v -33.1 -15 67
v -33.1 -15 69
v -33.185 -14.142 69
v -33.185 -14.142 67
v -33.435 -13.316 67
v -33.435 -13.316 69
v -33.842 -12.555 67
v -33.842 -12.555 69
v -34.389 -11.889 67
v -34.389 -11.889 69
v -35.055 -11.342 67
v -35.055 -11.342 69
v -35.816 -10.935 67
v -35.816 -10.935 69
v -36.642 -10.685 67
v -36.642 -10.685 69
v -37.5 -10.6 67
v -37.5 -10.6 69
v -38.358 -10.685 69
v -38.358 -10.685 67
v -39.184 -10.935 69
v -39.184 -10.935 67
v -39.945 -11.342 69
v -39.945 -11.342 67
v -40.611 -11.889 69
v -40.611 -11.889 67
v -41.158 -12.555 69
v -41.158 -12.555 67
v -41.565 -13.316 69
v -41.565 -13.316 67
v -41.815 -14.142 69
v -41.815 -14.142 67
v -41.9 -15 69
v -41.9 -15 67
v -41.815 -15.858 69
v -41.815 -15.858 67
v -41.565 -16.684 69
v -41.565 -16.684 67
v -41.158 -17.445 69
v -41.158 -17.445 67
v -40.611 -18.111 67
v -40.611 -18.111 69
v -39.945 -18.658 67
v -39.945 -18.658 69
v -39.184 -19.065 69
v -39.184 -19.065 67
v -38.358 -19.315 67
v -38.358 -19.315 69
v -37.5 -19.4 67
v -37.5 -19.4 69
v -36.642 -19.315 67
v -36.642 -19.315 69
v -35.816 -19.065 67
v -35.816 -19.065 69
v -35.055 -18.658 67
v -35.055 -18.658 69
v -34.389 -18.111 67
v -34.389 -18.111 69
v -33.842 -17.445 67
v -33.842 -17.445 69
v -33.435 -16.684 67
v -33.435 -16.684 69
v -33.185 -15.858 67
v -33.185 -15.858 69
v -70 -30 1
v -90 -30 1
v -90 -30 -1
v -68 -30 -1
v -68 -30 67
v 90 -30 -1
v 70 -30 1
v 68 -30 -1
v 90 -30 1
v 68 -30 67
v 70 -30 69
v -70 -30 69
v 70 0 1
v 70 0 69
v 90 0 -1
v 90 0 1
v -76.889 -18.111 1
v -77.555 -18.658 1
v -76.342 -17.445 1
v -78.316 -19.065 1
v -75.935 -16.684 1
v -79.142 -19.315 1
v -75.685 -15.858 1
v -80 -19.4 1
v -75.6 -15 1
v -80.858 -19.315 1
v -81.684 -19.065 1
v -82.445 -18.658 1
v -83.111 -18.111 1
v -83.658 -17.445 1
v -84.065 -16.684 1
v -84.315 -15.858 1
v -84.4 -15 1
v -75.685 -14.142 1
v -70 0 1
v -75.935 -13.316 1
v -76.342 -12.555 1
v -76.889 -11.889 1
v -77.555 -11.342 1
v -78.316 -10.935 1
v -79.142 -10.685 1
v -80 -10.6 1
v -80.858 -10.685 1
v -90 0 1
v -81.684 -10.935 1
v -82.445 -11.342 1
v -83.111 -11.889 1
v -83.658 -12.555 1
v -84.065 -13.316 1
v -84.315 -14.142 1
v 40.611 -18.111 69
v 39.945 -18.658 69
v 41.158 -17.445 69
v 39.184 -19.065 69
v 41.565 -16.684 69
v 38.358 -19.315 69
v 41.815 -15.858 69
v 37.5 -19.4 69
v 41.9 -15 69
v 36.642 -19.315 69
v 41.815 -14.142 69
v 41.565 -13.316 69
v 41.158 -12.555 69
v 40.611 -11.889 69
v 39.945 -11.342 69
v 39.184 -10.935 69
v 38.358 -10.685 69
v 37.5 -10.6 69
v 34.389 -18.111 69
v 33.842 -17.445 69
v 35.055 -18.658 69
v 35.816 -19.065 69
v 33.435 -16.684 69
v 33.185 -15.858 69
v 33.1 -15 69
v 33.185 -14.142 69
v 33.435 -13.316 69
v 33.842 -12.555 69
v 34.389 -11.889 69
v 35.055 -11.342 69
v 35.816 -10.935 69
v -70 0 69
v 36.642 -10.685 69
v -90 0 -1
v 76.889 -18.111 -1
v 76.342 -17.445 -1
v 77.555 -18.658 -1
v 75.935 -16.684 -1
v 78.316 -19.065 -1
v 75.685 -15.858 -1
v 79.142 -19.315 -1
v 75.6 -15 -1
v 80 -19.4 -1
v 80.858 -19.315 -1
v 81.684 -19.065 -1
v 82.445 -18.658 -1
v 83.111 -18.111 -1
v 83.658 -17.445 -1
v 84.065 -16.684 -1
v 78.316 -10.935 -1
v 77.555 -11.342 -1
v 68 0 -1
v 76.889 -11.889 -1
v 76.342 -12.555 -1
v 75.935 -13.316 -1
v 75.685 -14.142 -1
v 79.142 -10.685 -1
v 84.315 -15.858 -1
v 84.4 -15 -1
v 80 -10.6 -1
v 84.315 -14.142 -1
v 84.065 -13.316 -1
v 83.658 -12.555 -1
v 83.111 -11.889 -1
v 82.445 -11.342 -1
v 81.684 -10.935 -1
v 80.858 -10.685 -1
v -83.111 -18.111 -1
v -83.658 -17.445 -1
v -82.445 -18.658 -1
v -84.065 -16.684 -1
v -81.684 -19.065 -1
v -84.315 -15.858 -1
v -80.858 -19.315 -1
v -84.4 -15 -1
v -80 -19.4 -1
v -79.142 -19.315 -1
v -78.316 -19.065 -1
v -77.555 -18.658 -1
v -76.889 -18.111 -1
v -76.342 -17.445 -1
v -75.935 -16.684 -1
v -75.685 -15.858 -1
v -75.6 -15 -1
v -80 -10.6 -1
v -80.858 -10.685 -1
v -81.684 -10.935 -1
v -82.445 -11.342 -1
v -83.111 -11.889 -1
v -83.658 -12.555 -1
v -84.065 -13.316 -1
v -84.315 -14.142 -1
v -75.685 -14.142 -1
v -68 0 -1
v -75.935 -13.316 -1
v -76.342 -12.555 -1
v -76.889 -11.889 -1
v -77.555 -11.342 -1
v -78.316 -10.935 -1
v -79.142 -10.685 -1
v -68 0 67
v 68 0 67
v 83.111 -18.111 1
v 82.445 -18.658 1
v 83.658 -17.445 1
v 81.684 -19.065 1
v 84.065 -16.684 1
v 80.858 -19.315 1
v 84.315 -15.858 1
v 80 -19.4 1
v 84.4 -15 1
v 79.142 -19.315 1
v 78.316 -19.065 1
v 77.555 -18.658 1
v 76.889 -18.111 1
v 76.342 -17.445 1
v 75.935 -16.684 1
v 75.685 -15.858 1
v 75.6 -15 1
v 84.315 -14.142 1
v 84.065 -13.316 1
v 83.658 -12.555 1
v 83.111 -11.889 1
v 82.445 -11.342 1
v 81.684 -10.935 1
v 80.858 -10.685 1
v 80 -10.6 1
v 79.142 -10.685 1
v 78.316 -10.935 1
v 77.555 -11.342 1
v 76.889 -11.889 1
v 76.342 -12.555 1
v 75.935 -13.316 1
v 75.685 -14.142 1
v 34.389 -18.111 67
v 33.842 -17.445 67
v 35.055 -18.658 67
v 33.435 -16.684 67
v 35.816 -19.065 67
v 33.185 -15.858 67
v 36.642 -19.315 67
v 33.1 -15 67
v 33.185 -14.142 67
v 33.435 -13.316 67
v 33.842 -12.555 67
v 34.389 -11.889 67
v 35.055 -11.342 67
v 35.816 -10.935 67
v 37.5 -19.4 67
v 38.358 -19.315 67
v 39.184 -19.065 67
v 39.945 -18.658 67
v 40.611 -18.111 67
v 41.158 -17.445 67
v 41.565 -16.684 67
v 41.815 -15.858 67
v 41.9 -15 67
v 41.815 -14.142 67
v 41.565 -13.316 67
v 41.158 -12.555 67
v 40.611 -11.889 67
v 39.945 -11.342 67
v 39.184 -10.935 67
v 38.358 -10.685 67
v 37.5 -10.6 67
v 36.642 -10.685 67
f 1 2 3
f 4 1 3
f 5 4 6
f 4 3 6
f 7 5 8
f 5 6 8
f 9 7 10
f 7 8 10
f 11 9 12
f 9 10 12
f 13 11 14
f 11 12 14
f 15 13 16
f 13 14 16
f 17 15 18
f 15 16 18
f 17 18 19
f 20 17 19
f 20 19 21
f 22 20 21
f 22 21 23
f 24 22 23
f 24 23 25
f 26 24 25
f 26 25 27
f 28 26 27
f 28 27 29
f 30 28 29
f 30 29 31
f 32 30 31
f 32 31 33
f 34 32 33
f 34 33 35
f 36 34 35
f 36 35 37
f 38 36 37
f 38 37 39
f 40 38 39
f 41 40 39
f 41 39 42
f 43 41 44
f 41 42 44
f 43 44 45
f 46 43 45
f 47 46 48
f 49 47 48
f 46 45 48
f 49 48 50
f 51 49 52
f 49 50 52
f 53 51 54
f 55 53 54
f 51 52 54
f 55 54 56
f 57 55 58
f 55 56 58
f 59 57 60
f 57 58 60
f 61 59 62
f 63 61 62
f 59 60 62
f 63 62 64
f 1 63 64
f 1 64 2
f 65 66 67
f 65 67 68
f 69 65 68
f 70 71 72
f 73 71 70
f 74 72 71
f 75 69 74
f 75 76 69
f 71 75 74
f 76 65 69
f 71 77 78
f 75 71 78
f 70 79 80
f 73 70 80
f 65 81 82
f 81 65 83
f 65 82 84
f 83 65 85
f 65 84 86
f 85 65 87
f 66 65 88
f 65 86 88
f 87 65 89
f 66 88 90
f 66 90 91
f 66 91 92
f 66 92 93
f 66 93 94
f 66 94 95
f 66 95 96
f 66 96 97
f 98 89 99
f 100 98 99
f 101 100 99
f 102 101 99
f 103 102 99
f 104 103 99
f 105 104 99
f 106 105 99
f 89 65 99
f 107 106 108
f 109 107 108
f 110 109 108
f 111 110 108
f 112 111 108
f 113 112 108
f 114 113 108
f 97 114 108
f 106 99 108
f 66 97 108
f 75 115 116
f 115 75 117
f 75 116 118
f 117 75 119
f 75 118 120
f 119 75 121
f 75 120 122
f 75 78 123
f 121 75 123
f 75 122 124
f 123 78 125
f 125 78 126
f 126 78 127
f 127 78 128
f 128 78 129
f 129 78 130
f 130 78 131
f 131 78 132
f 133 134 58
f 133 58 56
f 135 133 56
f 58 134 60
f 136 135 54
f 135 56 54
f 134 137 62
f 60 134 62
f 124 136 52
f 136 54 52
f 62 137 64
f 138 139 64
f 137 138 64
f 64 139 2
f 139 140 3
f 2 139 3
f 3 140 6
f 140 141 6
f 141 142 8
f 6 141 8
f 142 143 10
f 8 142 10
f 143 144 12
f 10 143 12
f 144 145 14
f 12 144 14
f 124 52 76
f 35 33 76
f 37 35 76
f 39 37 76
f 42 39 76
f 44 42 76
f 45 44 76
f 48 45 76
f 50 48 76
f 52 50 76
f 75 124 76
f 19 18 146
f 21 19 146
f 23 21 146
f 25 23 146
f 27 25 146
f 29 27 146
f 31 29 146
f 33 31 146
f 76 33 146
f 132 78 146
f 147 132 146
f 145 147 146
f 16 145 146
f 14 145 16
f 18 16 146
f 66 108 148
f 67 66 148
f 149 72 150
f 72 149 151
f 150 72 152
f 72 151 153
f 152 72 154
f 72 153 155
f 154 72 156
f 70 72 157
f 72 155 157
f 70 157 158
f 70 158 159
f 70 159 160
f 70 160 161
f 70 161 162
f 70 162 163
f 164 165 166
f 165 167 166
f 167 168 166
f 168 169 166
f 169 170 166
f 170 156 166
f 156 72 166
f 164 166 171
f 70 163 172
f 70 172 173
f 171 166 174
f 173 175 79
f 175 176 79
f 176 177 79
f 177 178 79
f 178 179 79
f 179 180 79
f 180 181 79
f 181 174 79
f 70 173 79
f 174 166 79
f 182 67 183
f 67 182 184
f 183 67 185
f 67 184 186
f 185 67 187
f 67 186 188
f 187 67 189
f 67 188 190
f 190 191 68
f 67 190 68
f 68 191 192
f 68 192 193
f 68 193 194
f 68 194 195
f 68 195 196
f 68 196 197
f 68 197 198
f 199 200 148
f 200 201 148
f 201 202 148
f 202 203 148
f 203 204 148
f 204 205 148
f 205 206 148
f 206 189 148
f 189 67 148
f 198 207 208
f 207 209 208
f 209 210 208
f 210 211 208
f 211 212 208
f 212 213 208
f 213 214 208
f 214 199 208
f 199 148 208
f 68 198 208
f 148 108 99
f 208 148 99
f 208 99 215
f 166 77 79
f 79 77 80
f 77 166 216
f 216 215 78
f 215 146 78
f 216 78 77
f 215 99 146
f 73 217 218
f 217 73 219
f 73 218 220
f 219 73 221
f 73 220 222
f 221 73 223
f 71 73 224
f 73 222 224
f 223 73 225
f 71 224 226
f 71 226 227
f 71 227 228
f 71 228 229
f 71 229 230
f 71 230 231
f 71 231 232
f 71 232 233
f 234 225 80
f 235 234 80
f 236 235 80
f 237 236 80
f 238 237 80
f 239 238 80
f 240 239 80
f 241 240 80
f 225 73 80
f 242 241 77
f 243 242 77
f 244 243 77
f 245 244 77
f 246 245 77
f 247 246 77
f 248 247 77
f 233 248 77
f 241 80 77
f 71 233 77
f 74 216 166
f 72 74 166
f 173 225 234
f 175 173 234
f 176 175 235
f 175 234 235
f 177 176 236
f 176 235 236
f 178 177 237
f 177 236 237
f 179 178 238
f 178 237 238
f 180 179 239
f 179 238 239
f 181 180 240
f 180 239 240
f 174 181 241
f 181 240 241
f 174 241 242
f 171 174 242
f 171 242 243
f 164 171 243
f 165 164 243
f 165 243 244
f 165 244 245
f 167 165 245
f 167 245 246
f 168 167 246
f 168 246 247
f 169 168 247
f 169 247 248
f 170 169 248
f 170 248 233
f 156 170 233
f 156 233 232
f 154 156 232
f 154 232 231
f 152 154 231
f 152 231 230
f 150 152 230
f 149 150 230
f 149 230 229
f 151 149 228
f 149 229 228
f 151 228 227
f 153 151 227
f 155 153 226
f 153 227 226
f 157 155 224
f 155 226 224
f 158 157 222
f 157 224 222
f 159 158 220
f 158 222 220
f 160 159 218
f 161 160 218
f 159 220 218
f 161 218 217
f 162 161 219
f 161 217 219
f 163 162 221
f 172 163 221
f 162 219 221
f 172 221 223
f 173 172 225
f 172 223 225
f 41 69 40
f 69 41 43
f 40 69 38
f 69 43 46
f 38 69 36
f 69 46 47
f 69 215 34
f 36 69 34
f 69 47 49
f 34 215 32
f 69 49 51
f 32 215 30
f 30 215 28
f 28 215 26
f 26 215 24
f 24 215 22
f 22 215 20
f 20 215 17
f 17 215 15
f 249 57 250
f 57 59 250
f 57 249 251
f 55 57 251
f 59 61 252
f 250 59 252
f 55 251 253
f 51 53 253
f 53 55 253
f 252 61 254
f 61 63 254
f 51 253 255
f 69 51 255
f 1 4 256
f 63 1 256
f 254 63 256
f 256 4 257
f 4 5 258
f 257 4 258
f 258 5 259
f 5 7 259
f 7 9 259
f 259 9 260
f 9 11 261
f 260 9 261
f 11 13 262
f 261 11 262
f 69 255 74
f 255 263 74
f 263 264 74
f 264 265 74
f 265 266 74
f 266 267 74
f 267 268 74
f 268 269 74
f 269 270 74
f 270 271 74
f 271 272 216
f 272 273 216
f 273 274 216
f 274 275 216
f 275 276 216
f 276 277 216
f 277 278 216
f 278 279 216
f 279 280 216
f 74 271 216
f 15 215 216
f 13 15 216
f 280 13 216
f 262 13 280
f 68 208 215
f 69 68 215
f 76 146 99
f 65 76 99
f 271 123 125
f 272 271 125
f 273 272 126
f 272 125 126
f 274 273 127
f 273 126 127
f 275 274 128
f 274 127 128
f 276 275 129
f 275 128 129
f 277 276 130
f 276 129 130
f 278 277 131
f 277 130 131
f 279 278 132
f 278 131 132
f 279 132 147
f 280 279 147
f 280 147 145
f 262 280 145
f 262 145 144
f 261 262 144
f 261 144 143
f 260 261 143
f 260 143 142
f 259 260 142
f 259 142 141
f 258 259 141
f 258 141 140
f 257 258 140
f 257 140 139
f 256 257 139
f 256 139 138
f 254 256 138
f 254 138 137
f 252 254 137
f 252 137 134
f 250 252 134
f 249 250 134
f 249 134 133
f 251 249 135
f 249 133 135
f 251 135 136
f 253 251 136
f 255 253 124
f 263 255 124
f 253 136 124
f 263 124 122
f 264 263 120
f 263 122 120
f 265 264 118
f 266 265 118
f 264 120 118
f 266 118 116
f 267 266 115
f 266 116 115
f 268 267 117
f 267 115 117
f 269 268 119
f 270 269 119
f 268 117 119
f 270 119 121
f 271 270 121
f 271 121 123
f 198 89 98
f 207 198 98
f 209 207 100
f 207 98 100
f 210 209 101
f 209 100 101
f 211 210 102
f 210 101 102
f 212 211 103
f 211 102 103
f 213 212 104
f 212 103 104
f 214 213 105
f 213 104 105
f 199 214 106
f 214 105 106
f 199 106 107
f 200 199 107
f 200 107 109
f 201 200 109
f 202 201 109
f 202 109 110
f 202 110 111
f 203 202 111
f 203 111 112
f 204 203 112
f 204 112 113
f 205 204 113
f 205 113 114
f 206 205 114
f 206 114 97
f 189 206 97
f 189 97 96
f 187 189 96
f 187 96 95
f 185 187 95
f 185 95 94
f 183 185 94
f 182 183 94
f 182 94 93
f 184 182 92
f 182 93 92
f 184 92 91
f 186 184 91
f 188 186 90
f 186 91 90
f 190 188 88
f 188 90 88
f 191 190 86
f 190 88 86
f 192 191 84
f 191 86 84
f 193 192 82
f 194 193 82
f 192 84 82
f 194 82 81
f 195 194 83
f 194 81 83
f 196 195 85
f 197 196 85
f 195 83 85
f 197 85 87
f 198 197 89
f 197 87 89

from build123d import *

# Parameters (mm, degrees)
F1_DEPTH = 30
F2_R     = 4.4
F3_R     = 4.4
F4_DEPTH = 25


# Not quite as in the source:
# - a feature names something its author has since deleted; it is built from what else it names


with BuildPart() as f1:
    # F0 (on Front) → F1 (new body)
    with BuildSketch(Plane.XZ):
        Polygon((90, -1), (90, 1), (70, 1), (70, 69), (-70, 69), (-70, 1), (-90, 1), (-90, -1), (-68, -1), (-68, 67), (68, 67), (68, -1), align=None)
    extrude(amount=F1_DEPTH)

    # F2 (on face) + F3 (on face) → F4 (cut)
    with BuildSketch(Plane.XY.offset(1)):
        with Locations((-80, -15)):
            Circle(F2_R)
        with Locations((80, -15)):
            Circle(F2_R)
    with BuildSketch(Plane.XY.offset(69)):
        with Locations((-37.5, -15)):
            Circle(F3_R)
        with Locations((37.5, -15)):
            Circle(F3_R)
    extrude(amount=-F4_DEPTH, mode=Mode.SUBTRACT)


solid = f1.part
